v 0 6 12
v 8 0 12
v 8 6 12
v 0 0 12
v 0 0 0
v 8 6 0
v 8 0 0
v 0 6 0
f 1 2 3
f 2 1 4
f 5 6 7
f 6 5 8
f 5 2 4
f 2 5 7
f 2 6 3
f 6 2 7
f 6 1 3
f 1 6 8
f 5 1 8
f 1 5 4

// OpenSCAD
// Many Projects - Test Fixture: another project in a subfolder.
cube([8, 6, 12]);
